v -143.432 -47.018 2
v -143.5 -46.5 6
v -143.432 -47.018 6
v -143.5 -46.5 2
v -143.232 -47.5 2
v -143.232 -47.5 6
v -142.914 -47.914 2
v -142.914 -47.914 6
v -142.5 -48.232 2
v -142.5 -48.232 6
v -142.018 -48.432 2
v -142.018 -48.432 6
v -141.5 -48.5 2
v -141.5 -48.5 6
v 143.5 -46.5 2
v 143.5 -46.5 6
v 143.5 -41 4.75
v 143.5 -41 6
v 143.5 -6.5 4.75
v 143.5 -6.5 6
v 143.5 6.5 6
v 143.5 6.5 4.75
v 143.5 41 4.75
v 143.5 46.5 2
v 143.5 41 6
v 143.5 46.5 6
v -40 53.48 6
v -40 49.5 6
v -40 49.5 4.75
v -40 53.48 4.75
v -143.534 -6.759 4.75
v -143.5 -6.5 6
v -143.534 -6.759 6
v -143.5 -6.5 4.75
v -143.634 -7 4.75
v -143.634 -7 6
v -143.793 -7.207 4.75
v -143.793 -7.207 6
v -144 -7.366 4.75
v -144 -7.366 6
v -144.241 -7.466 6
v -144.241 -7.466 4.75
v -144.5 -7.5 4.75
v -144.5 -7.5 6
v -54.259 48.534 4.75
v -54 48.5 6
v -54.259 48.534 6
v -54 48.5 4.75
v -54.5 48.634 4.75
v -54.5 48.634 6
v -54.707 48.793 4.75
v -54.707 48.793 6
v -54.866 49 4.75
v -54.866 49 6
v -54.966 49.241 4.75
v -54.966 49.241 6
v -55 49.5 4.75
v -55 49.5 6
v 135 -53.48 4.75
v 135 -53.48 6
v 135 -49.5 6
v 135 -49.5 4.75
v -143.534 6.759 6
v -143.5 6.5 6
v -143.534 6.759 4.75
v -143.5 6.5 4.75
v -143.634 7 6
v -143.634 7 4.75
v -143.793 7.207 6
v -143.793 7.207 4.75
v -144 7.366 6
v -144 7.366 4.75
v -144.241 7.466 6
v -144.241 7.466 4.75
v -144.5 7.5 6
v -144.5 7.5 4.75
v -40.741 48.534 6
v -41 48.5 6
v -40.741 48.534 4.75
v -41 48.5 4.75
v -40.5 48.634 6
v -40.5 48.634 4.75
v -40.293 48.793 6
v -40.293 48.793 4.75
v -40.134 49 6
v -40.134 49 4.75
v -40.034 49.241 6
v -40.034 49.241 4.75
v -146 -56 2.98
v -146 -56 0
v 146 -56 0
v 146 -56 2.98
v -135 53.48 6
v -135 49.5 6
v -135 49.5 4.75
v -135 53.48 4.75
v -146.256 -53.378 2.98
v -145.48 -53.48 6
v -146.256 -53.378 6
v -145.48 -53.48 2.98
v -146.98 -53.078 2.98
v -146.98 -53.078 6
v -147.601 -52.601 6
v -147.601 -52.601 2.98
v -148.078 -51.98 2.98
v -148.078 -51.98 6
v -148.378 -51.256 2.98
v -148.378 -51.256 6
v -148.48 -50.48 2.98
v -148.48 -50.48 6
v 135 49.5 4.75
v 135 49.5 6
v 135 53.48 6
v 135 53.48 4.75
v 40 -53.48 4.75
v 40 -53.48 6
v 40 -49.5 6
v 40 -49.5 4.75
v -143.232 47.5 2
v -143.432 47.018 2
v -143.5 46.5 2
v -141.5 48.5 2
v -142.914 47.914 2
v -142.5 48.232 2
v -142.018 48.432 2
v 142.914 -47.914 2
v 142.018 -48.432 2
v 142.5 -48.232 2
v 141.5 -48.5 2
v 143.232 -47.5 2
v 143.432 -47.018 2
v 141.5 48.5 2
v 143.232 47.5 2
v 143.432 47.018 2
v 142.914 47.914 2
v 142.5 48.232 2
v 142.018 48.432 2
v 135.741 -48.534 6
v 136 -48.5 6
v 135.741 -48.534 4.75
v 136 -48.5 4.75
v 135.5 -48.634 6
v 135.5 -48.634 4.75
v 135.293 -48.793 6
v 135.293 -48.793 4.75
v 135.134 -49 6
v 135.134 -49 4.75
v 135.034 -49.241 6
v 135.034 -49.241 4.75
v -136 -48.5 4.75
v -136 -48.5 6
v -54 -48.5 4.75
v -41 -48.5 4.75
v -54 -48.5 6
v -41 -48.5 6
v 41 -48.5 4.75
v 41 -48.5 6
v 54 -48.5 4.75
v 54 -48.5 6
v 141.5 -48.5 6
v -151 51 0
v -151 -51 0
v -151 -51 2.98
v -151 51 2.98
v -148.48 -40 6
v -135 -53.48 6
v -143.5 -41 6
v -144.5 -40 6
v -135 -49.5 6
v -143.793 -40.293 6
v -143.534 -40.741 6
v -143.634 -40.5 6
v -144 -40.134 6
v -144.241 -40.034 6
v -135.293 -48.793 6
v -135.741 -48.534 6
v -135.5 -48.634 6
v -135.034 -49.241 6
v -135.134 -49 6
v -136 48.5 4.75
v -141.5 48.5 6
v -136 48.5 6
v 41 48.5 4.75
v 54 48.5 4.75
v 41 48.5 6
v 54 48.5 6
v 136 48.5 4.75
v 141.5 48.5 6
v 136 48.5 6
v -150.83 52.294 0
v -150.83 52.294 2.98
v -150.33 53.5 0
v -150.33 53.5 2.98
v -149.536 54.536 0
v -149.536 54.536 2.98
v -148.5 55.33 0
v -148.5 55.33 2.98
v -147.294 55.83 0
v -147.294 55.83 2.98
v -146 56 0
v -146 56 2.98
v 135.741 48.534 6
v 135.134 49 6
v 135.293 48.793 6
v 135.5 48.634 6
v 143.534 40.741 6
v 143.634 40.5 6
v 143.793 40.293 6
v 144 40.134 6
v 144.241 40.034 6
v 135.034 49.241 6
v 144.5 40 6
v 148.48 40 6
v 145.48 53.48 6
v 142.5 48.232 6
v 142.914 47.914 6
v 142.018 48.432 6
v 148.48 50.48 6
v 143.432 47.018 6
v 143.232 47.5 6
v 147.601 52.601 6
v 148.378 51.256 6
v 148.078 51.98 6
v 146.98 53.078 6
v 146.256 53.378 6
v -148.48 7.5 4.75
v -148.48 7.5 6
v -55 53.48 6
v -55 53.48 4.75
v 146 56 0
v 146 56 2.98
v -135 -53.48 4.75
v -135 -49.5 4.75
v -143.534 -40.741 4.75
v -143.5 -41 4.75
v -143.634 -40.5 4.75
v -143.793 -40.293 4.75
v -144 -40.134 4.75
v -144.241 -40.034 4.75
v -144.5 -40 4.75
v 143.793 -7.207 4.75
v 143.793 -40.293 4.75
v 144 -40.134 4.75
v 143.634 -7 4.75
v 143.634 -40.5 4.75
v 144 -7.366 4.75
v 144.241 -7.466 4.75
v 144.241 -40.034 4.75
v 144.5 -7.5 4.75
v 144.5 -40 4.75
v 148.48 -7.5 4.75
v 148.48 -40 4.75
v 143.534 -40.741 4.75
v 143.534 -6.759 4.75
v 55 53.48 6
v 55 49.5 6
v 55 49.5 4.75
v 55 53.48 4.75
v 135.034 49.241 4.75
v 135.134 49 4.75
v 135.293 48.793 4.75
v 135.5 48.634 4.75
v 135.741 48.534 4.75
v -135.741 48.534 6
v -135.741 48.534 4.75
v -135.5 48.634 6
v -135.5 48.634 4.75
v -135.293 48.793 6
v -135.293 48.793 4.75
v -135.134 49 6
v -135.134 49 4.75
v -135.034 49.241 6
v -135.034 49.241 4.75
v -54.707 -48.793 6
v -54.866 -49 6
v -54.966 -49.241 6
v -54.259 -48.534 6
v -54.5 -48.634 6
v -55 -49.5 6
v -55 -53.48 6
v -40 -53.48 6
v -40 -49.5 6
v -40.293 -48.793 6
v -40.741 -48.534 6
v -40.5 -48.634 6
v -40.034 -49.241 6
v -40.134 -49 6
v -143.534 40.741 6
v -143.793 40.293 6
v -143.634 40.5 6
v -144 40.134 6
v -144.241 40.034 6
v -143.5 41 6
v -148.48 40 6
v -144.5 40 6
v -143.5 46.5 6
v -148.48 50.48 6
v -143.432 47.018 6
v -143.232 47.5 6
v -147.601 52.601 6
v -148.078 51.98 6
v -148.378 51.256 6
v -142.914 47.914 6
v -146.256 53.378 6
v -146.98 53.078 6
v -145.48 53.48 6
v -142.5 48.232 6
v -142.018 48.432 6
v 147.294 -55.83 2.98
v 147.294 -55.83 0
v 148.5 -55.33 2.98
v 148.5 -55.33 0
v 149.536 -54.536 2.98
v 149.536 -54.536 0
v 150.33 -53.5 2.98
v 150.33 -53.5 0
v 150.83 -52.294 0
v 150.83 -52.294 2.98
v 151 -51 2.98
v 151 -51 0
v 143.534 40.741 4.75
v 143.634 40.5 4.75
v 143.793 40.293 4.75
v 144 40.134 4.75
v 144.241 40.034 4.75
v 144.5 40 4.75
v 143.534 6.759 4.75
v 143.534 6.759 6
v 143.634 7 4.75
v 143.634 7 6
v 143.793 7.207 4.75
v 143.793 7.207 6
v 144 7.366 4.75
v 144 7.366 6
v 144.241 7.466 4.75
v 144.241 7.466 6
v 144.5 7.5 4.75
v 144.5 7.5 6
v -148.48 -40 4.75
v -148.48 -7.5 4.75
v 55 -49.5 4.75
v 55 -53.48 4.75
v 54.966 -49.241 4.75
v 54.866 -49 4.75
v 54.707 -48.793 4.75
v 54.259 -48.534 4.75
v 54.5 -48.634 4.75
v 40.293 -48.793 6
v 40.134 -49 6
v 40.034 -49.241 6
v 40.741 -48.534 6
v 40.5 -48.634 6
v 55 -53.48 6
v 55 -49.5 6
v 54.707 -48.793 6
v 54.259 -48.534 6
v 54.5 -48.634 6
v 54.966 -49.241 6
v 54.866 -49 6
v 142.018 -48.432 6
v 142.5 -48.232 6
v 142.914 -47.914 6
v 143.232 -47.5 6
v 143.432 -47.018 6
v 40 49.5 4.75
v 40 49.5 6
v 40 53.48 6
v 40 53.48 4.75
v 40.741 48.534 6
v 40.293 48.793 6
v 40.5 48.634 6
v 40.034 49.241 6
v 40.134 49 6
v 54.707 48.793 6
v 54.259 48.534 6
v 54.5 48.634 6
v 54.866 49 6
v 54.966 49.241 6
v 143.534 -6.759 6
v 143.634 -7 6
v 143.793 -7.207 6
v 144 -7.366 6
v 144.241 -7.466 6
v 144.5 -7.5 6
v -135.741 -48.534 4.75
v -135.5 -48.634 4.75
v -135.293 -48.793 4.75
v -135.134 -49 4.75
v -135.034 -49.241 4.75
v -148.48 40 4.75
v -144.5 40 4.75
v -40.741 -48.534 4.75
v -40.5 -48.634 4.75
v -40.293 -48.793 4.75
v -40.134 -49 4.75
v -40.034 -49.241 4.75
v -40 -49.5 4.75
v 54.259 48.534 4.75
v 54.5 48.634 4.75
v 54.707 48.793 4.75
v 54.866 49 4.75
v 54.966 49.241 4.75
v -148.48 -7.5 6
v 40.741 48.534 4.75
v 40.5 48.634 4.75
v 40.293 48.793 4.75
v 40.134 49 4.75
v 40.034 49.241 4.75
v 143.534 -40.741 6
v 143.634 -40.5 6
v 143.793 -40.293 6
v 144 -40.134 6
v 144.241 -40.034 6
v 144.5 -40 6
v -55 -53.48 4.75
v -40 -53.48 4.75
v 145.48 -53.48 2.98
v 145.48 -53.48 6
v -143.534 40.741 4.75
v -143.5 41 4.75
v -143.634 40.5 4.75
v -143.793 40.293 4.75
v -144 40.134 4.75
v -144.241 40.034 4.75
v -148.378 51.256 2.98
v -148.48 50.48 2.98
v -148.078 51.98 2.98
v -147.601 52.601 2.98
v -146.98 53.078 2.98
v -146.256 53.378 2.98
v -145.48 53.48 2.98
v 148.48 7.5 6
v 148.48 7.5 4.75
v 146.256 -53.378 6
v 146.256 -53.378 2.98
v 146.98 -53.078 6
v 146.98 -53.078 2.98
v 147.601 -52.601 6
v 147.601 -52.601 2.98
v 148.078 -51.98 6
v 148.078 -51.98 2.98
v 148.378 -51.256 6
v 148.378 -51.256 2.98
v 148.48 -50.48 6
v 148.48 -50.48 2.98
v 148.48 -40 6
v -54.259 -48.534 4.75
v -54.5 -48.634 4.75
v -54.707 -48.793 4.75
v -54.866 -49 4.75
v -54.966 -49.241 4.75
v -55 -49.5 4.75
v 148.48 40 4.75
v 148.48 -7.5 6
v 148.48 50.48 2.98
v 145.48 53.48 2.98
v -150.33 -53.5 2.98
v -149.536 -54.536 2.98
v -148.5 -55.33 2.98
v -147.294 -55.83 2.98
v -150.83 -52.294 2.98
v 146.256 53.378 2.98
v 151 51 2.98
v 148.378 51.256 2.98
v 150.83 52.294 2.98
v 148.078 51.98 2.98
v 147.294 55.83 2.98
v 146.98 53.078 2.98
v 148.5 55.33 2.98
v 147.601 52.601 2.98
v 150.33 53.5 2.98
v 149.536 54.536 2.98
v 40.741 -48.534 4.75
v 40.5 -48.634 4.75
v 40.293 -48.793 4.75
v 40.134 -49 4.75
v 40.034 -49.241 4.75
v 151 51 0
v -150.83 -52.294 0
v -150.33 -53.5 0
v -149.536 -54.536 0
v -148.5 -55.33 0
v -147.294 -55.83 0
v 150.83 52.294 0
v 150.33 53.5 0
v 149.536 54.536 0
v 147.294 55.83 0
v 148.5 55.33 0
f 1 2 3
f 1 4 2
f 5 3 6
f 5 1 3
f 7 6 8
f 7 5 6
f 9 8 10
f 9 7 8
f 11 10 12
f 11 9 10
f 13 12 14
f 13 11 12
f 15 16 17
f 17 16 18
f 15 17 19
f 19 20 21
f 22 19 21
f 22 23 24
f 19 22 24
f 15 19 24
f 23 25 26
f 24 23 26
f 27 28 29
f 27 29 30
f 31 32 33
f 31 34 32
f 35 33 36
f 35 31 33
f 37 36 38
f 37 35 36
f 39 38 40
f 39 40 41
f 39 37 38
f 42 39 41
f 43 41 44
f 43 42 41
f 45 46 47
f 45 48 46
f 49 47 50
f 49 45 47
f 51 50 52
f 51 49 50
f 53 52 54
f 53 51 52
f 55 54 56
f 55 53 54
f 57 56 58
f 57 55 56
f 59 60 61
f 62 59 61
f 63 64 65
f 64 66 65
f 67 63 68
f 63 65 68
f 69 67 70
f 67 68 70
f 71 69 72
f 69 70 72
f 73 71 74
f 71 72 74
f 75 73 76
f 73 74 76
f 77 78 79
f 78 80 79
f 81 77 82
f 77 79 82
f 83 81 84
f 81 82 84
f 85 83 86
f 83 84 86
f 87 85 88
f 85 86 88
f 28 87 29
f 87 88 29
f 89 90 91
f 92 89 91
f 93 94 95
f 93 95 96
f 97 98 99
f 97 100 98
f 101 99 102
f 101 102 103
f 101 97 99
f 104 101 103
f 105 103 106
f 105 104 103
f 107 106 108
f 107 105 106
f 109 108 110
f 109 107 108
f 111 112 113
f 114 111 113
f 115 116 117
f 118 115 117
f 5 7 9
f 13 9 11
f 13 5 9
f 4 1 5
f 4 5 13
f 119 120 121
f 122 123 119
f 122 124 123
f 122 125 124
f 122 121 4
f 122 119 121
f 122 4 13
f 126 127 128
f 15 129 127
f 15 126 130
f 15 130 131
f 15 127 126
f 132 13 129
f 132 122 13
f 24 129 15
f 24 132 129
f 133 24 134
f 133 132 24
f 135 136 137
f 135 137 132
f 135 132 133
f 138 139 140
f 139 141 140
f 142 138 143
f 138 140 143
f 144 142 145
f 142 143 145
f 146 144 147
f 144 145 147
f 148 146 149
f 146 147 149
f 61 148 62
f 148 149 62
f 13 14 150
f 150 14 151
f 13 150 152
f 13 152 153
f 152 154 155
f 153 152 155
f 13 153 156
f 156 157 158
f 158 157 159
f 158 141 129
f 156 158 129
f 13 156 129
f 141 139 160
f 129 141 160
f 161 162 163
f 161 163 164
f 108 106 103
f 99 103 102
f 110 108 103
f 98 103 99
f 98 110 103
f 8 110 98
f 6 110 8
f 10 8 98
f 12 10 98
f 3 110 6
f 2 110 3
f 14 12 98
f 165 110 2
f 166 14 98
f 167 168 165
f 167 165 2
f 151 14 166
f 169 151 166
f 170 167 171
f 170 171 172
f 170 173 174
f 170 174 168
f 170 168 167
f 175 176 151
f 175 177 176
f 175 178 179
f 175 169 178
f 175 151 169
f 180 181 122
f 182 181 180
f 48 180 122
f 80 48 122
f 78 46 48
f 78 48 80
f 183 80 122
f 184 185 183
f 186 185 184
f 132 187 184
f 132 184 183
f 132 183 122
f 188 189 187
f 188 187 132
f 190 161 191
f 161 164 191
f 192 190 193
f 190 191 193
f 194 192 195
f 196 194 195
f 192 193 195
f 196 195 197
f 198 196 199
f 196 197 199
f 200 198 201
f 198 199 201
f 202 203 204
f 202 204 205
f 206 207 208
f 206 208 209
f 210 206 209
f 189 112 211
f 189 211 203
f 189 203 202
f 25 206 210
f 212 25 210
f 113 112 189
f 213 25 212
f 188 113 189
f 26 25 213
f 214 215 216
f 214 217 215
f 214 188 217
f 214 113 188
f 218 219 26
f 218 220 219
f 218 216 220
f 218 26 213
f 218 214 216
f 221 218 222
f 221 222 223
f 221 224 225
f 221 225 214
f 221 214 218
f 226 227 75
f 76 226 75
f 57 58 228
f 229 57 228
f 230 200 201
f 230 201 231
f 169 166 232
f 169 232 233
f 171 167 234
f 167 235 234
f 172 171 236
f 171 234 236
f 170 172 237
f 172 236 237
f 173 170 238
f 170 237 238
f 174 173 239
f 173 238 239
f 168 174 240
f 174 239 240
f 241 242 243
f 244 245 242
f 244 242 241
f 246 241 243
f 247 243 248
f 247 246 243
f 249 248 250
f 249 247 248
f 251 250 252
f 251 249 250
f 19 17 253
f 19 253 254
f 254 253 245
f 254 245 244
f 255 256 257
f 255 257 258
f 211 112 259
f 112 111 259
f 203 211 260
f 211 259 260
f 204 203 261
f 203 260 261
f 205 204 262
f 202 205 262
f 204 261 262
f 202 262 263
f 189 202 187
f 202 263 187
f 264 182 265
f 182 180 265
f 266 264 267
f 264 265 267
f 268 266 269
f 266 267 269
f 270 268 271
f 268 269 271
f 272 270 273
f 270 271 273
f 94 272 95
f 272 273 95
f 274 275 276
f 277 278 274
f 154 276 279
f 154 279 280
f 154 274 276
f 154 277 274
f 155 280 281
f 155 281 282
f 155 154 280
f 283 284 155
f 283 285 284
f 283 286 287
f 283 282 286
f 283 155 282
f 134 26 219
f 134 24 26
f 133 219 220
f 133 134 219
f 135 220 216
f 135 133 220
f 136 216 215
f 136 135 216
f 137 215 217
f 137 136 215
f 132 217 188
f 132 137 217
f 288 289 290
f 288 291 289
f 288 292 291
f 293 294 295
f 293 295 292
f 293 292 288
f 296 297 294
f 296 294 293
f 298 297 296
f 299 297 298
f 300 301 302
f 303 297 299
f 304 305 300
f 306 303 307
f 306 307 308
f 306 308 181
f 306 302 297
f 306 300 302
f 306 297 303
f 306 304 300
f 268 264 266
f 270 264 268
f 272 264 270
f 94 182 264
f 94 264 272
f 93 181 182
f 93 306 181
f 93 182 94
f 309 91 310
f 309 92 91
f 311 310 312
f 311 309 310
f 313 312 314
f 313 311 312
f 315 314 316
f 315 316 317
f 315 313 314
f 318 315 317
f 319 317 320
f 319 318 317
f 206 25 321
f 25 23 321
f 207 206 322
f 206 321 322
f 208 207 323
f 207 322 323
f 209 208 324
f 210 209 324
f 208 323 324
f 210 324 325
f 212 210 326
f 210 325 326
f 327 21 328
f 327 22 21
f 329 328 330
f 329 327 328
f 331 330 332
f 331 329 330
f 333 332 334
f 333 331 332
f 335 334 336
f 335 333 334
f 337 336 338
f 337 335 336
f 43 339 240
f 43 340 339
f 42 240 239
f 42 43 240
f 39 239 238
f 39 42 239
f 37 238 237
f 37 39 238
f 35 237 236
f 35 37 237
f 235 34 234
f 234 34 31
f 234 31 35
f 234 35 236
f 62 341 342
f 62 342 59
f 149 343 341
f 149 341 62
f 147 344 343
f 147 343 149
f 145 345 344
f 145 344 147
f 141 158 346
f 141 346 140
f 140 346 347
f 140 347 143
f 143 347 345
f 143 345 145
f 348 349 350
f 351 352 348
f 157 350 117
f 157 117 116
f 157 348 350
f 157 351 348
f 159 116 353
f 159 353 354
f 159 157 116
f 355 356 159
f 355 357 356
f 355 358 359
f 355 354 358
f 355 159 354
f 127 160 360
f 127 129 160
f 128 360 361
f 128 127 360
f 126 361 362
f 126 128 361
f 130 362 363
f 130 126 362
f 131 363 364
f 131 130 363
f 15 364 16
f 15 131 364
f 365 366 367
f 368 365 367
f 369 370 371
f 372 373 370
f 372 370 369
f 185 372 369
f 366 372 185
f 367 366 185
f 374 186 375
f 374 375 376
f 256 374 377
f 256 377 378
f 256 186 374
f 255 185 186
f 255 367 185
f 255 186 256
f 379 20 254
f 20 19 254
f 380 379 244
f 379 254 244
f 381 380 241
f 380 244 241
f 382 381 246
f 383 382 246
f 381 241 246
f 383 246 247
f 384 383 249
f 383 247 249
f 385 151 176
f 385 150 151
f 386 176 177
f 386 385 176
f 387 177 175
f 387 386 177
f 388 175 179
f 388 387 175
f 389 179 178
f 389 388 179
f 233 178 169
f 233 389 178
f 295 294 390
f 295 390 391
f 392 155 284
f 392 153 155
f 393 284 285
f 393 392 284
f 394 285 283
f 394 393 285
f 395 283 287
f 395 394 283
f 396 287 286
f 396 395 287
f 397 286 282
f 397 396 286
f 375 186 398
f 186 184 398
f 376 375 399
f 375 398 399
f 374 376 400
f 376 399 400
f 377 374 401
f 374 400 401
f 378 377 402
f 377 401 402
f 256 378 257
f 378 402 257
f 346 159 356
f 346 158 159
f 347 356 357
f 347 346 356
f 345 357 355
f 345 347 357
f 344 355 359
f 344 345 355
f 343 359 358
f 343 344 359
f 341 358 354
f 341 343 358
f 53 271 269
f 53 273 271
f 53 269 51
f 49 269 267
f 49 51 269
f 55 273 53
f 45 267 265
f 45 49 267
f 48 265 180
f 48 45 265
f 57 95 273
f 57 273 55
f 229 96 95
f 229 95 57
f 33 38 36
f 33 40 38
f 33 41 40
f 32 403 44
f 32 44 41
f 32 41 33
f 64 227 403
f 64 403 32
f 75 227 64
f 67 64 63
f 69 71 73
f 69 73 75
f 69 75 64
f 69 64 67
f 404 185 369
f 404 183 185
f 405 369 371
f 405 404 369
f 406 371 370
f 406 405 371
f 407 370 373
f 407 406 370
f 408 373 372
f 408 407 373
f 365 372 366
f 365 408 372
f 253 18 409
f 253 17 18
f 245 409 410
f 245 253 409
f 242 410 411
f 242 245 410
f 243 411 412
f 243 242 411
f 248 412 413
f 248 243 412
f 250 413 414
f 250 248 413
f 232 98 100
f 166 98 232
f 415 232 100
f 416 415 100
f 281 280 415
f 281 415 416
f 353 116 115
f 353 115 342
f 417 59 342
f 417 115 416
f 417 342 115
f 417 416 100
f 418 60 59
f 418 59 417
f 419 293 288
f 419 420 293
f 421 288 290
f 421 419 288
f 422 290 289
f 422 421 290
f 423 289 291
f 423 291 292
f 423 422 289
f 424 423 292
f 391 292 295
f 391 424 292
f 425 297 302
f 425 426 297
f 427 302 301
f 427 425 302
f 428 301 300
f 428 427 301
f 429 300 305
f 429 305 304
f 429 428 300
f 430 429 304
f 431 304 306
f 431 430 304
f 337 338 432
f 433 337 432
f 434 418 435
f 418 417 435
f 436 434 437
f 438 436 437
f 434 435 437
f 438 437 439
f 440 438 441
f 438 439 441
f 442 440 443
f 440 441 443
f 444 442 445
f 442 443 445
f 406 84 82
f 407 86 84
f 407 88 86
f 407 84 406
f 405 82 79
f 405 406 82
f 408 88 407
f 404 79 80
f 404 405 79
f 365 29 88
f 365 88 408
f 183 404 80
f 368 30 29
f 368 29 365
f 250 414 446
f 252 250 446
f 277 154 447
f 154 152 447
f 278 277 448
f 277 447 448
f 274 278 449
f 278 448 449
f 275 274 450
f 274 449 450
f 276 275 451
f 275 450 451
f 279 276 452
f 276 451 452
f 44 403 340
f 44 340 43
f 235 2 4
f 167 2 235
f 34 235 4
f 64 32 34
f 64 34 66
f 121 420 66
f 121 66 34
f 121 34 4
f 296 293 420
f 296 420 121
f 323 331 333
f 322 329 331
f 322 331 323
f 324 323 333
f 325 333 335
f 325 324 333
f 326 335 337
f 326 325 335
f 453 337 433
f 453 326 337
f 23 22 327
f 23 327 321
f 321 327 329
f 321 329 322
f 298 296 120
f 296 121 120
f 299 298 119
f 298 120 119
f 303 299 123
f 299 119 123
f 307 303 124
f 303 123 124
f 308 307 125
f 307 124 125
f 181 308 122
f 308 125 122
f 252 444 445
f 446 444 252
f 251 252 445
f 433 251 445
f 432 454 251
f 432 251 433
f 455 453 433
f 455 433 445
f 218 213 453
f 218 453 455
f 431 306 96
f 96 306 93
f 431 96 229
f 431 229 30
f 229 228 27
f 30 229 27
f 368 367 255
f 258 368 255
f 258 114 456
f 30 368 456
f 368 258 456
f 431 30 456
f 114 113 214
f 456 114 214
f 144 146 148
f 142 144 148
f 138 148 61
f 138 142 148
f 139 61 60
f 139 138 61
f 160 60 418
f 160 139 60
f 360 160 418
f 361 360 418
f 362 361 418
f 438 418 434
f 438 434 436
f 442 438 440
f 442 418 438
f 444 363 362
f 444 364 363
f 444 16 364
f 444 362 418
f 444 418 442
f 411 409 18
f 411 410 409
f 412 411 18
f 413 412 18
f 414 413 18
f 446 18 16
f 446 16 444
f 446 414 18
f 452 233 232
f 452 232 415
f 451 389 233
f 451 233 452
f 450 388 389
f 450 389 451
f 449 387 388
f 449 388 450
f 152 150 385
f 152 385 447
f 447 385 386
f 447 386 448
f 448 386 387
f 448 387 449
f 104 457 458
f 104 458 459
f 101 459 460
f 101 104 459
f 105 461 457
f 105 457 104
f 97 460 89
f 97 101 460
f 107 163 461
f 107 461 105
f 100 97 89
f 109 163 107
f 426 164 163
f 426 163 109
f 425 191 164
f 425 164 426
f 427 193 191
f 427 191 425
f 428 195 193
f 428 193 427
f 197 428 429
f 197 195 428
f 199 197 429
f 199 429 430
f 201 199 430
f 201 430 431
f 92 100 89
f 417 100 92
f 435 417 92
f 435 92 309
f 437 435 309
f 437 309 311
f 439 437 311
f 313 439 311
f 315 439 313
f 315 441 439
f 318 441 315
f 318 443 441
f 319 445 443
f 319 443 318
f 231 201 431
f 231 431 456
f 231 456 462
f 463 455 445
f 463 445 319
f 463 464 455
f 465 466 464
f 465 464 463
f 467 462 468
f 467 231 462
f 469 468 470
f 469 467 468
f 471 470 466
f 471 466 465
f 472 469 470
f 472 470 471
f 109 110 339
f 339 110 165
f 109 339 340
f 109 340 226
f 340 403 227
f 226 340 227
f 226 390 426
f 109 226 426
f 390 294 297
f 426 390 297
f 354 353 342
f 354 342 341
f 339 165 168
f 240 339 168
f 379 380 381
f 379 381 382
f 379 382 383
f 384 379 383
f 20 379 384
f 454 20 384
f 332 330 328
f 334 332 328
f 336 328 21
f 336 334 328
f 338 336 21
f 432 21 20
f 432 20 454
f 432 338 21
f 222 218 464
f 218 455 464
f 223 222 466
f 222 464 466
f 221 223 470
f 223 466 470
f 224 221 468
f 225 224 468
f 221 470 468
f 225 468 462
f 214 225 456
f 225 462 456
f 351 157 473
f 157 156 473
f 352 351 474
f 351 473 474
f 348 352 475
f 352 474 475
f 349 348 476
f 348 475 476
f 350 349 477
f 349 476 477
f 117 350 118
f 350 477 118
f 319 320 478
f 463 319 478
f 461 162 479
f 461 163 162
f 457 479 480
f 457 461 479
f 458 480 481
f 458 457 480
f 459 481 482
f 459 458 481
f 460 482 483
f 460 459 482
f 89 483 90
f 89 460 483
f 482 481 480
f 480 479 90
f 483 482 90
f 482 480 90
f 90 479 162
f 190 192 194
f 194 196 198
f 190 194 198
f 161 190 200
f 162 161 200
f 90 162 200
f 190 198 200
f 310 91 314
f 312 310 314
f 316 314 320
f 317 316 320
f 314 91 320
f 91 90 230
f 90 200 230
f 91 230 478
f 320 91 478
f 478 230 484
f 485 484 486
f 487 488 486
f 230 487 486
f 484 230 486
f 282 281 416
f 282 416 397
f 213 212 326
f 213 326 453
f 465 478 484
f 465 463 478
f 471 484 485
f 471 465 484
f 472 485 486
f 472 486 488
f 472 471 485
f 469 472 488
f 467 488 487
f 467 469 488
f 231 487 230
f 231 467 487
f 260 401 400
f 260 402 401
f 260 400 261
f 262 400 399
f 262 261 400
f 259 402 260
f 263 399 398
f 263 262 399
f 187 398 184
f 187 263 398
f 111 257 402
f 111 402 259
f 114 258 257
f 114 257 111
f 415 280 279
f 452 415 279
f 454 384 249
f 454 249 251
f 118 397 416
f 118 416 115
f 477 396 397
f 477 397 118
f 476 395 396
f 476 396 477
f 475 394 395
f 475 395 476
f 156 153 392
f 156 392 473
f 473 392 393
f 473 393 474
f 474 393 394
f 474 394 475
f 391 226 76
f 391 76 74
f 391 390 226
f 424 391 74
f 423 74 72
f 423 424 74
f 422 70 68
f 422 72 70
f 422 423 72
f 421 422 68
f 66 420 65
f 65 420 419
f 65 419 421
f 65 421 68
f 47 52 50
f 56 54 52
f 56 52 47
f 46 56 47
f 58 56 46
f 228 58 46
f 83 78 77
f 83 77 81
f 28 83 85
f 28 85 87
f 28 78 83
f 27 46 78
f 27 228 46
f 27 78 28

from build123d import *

# Parameters (mm, degrees)
SKETCH_W        = 302
SKETCH_H        = 112
PAD_DEPTH       = 6
SKETCH001_W     = 287
SKETCH001_H     = 97
POCKET_DEPTH    = 4
SKETCH002_W     = 302
SKETCH002_H     = 112
SKETCH002_W_2   = 296.96
SKETCH002_H_2   = 106.96
POCKET001_DEPTH = 3.02
FILLET_R        = 3
FILLET001_R     = 5
FILLET002_R     = 5
FILLET003_R     = 3
FILLET004_R     = 2
FILLET005_R     = 2
FILLET006_R     = 5
FILLET007_R     = 3
FILLET008_R     = 2
FILLET009_R     = 5
FILLET010_R     = 3
FILLET011_R     = 2
SKETCH003_W     = 80
SKETCH003_H     = 5
POCKET002_DEPTH = 1.25
SKETCH004_W     = 5
SKETCH004_H     = 32.5
POCKET003_DEPTH = 1.25
FILLET012_R     = 1
FILLET013_R     = 1
FILLET014_R     = 1
FILLET015_R     = 1
FILLET016_R     = 1
FILLET017_R     = 1
FILLET018_R     = 1
FILLET019_R     = 1
FILLET020_R     = 1
FILLET021_R     = 1
FILLET022_R     = 1
FILLET023_R     = 1
FILLET024_R     = 1
FILLET025_R     = 1
FILLET026_R     = 1
FILLET027_R     = 1
FILLET028_R     = 1
FILLET029_R     = 1
FILLET030_R     = 1
FILLET031_R     = 1


with BuildPart() as part:
    # Sketch → Pad (new body)
    with BuildSketch(Plane.XY):
        Rectangle(SKETCH_W, SKETCH_H)
    extrude(amount=PAD_DEPTH)

    # Sketch001 (on Face6 of Pad) → Pocket (cut)
    with BuildSketch(Plane.XY.offset(6)):
        Rectangle(SKETCH001_W, SKETCH001_H)
    extrude(amount=-POCKET_DEPTH, mode=Mode.SUBTRACT)

    # Sketch002 (on Face5 of Pocket) → Pocket001 (cut)
    with BuildSketch(Plane.XY.offset(6)):
        Rectangle(SKETCH002_W, SKETCH002_H)
        Rectangle(SKETCH002_W_2, SKETCH002_H_2, mode=Mode.SUBTRACT)
    extrude(amount=-POCKET001_DEPTH, mode=Mode.SUBTRACT)

    # Fillet
    fillet_edges = [part.edges().sort_by_distance(p)[0] for p in [
        (-148.48, -53.48, 4.49),
    ]]
    fillet(fillet_edges, radius=FILLET_R)

    # Fillet001
    fillet001_edges = [part.edges().sort_by_distance(p)[0] for p in [
        (-151, -56, 1.49),
    ]]
    fillet(fillet001_edges, radius=FILLET001_R)

    # Fillet002
    fillet002_edges = [part.edges().sort_by_distance(p)[0] for p in [
        (-151, 56, 1.49),
    ]]
    fillet(fillet002_edges, radius=FILLET002_R)

    # Fillet003
    fillet003_edges = [part.edges().sort_by_distance(p)[0] for p in [
        (-148.48, 53.48, 4.49),
    ]]
    fillet(fillet003_edges, radius=FILLET003_R)

    # Fillet004
    fillet004_edges = [part.edges().sort_by_distance(p)[0] for p in [
        (-143.5, 48.5, 4),
    ]]
    fillet(fillet004_edges, radius=FILLET004_R)

    # Fillet005
    fillet005_edges = [part.edges().sort_by_distance(p)[0] for p in [
        (-143.5, -48.5, 4),
    ]]
    fillet(fillet005_edges, radius=FILLET005_R)

    # Fillet006
    fillet006_edges = [part.edges().sort_by_distance(p)[0] for p in [
        (151, -56, 1.49),
    ]]
    fillet(fillet006_edges, radius=FILLET006_R)

    # Fillet007
    fillet007_edges = [part.edges().sort_by_distance(p)[0] for p in [
        (148.48, -53.48, 4.49),
    ]]
    fillet(fillet007_edges, radius=FILLET007_R)

    # Fillet008
    fillet008_edges = [part.edges().sort_by_distance(p)[0] for p in [
        (143.5, -48.5, 4),
    ]]
    fillet(fillet008_edges, radius=FILLET008_R)

    # Fillet009
    fillet009_edges = [part.edges().sort_by_distance(p)[0] for p in [
        (151, 56, 1.49),
    ]]
    fillet(fillet009_edges, radius=FILLET009_R)

    # Fillet010
    fillet010_edges = [part.edges().sort_by_distance(p)[0] for p in [
        (148.48, 53.48, 4.49),
    ]]
    fillet(fillet010_edges, radius=FILLET010_R)

    # Fillet011
    fillet011_edges = [part.edges().sort_by_distance(p)[0] for p in [
        (143.5, 48.5, 4),
    ]]
    fillet(fillet011_edges, radius=FILLET011_R)

    # Sketch003 (on Face1 of Fillet011) → Pocket002 (cut)
    with BuildSketch(Plane.XY.offset(6)):
        with Locations((0, 51)):
            Rectangle(SKETCH003_W, SKETCH003_H)
        with Locations((-95, 51)):
            Rectangle(SKETCH003_W, SKETCH003_H)
        with Locations((95, 51)):
            Rectangle(SKETCH003_W, SKETCH003_H)
        with Locations((95, -51)):
            Rectangle(SKETCH003_W, SKETCH003_H)
        with Locations((0, -51)):
            Rectangle(SKETCH003_W, SKETCH003_H)
        with Locations((-95, -51)):
            Rectangle(SKETCH003_W, SKETCH003_H)
    extrude(amount=-POCKET002_DEPTH, mode=Mode.SUBTRACT)

    # Sketch004 (on Face25 of Pocket002) → Pocket003 (cut)
    with BuildSketch(Plane.XY.offset(6)):
        with Locations((-146, 23.75)):
            Rectangle(SKETCH004_W, SKETCH004_H)
        with Locations((-146, -23.75)):
            Rectangle(SKETCH004_W, SKETCH004_H)
        with Locations((146, 23.75)):
            Rectangle(SKETCH004_W, SKETCH004_H)
        with Locations((146, -23.75)):
            Rectangle(SKETCH004_W, SKETCH004_H)
    extrude(amount=-POCKET003_DEPTH, mode=Mode.SUBTRACT)

    # Fillet012
    fillet012_edges = [part.edges().sort_by_distance(p)[0] for p in [
        (-55, 48.5, 5.375),
    ]]
    fillet(fillet012_edges, radius=FILLET012_R)

    # Fillet013
    fillet013_edges = [part.edges().sort_by_distance(p)[0] for p in [
        (-40, 48.5, 5.375),
    ]]
    fillet(fillet013_edges, radius=FILLET013_R)

    # Fillet014
    fillet014_edges = [part.edges().sort_by_distance(p)[0] for p in [
        (-135, 48.5, 5.375),
    ]]
    fillet(fillet014_edges, radius=FILLET014_R)

    # Fillet015
    fillet015_edges = [part.edges().sort_by_distance(p)[0] for p in [
        (-143.5, 40, 5.375),
    ]]
    fillet(fillet015_edges, radius=FILLET015_R)

    # Fillet016
    fillet016_edges = [part.edges().sort_by_distance(p)[0] for p in [
        (-143.5, 7.5, 5.375),
    ]]
    fillet(fillet016_edges, radius=FILLET016_R)

    # Fillet017
    fillet017_edges = [part.edges().sort_by_distance(p)[0] for p in [
        (-143.5, -7.5, 5.375),
    ]]
    fillet(fillet017_edges, radius=FILLET017_R)

    # Fillet018
    fillet018_edges = [part.edges().sort_by_distance(p)[0] for p in [
        (-143.5, -40, 5.375),
    ]]
    fillet(fillet018_edges, radius=FILLET018_R)

    # Fillet019
    fillet019_edges = [part.edges().sort_by_distance(p)[0] for p in [
        (-135, -48.5, 5.375),
    ]]
    fillet(fillet019_edges, radius=FILLET019_R)

    # Fillet020
    fillet020_edges = [part.edges().sort_by_distance(p)[0] for p in [
        (-40, -48.5, 5.375),
    ]]
    fillet(fillet020_edges, radius=FILLET020_R)

    # Fillet021
    fillet021_edges = [part.edges().sort_by_distance(p)[0] for p in [
        (-55, -48.5, 5.375),
    ]]
    fillet(fillet021_edges, radius=FILLET021_R)

    # Fillet022
    fillet022_edges = [part.edges().sort_by_distance(p)[0] for p in [
        (40, -48.5, 5.375),
    ]]
    fillet(fillet022_edges, radius=FILLET022_R)

    # Fillet023
    fillet023_edges = [part.edges().sort_by_distance(p)[0] for p in [
        (55, -48.5, 5.375),
    ]]
    fillet(fillet023_edges, radius=FILLET023_R)

    # Fillet024
    fillet024_edges = [part.edges().sort_by_distance(p)[0] for p in [
        (135, -48.5, 5.375),
    ]]
    fillet(fillet024_edges, radius=FILLET024_R)

    # Fillet025
    fillet025_edges = [part.edges().sort_by_distance(p)[0] for p in [
        (143.5, -40, 5.375),
    ]]
    fillet(fillet025_edges, radius=FILLET025_R)

    # Fillet026
    fillet026_edges = [part.edges().sort_by_distance(p)[0] for p in [
        (143.5, 7.5, 5.375),
    ]]
    fillet(fillet026_edges, radius=FILLET026_R)

    # Fillet027
    fillet027_edges = [part.edges().sort_by_distance(p)[0] for p in [
        (143.5, -7.5, 5.375),
    ]]
    fillet(fillet027_edges, radius=FILLET027_R)

    # Fillet028
    fillet028_edges = [part.edges().sort_by_distance(p)[0] for p in [
        (135, 48.5, 5.375),
    ]]
    fillet(fillet028_edges, radius=FILLET028_R)

    # Fillet029
    fillet029_edges = [part.edges().sort_by_distance(p)[0] for p in [
        (143.5, 40, 5.375),
    ]]
    fillet(fillet029_edges, radius=FILLET029_R)

    # Fillet030
    fillet030_edges = [part.edges().sort_by_distance(p)[0] for p in [
        (55, 48.5, 5.375),
    ]]
    fillet(fillet030_edges, radius=FILLET030_R)

    # Fillet031
    fillet031_edges = [part.edges().sort_by_distance(p)[0] for p in [
        (40, 48.5, 5.375),
    ]]
    fillet(fillet031_edges, radius=FILLET031_R)


solid = part.part
